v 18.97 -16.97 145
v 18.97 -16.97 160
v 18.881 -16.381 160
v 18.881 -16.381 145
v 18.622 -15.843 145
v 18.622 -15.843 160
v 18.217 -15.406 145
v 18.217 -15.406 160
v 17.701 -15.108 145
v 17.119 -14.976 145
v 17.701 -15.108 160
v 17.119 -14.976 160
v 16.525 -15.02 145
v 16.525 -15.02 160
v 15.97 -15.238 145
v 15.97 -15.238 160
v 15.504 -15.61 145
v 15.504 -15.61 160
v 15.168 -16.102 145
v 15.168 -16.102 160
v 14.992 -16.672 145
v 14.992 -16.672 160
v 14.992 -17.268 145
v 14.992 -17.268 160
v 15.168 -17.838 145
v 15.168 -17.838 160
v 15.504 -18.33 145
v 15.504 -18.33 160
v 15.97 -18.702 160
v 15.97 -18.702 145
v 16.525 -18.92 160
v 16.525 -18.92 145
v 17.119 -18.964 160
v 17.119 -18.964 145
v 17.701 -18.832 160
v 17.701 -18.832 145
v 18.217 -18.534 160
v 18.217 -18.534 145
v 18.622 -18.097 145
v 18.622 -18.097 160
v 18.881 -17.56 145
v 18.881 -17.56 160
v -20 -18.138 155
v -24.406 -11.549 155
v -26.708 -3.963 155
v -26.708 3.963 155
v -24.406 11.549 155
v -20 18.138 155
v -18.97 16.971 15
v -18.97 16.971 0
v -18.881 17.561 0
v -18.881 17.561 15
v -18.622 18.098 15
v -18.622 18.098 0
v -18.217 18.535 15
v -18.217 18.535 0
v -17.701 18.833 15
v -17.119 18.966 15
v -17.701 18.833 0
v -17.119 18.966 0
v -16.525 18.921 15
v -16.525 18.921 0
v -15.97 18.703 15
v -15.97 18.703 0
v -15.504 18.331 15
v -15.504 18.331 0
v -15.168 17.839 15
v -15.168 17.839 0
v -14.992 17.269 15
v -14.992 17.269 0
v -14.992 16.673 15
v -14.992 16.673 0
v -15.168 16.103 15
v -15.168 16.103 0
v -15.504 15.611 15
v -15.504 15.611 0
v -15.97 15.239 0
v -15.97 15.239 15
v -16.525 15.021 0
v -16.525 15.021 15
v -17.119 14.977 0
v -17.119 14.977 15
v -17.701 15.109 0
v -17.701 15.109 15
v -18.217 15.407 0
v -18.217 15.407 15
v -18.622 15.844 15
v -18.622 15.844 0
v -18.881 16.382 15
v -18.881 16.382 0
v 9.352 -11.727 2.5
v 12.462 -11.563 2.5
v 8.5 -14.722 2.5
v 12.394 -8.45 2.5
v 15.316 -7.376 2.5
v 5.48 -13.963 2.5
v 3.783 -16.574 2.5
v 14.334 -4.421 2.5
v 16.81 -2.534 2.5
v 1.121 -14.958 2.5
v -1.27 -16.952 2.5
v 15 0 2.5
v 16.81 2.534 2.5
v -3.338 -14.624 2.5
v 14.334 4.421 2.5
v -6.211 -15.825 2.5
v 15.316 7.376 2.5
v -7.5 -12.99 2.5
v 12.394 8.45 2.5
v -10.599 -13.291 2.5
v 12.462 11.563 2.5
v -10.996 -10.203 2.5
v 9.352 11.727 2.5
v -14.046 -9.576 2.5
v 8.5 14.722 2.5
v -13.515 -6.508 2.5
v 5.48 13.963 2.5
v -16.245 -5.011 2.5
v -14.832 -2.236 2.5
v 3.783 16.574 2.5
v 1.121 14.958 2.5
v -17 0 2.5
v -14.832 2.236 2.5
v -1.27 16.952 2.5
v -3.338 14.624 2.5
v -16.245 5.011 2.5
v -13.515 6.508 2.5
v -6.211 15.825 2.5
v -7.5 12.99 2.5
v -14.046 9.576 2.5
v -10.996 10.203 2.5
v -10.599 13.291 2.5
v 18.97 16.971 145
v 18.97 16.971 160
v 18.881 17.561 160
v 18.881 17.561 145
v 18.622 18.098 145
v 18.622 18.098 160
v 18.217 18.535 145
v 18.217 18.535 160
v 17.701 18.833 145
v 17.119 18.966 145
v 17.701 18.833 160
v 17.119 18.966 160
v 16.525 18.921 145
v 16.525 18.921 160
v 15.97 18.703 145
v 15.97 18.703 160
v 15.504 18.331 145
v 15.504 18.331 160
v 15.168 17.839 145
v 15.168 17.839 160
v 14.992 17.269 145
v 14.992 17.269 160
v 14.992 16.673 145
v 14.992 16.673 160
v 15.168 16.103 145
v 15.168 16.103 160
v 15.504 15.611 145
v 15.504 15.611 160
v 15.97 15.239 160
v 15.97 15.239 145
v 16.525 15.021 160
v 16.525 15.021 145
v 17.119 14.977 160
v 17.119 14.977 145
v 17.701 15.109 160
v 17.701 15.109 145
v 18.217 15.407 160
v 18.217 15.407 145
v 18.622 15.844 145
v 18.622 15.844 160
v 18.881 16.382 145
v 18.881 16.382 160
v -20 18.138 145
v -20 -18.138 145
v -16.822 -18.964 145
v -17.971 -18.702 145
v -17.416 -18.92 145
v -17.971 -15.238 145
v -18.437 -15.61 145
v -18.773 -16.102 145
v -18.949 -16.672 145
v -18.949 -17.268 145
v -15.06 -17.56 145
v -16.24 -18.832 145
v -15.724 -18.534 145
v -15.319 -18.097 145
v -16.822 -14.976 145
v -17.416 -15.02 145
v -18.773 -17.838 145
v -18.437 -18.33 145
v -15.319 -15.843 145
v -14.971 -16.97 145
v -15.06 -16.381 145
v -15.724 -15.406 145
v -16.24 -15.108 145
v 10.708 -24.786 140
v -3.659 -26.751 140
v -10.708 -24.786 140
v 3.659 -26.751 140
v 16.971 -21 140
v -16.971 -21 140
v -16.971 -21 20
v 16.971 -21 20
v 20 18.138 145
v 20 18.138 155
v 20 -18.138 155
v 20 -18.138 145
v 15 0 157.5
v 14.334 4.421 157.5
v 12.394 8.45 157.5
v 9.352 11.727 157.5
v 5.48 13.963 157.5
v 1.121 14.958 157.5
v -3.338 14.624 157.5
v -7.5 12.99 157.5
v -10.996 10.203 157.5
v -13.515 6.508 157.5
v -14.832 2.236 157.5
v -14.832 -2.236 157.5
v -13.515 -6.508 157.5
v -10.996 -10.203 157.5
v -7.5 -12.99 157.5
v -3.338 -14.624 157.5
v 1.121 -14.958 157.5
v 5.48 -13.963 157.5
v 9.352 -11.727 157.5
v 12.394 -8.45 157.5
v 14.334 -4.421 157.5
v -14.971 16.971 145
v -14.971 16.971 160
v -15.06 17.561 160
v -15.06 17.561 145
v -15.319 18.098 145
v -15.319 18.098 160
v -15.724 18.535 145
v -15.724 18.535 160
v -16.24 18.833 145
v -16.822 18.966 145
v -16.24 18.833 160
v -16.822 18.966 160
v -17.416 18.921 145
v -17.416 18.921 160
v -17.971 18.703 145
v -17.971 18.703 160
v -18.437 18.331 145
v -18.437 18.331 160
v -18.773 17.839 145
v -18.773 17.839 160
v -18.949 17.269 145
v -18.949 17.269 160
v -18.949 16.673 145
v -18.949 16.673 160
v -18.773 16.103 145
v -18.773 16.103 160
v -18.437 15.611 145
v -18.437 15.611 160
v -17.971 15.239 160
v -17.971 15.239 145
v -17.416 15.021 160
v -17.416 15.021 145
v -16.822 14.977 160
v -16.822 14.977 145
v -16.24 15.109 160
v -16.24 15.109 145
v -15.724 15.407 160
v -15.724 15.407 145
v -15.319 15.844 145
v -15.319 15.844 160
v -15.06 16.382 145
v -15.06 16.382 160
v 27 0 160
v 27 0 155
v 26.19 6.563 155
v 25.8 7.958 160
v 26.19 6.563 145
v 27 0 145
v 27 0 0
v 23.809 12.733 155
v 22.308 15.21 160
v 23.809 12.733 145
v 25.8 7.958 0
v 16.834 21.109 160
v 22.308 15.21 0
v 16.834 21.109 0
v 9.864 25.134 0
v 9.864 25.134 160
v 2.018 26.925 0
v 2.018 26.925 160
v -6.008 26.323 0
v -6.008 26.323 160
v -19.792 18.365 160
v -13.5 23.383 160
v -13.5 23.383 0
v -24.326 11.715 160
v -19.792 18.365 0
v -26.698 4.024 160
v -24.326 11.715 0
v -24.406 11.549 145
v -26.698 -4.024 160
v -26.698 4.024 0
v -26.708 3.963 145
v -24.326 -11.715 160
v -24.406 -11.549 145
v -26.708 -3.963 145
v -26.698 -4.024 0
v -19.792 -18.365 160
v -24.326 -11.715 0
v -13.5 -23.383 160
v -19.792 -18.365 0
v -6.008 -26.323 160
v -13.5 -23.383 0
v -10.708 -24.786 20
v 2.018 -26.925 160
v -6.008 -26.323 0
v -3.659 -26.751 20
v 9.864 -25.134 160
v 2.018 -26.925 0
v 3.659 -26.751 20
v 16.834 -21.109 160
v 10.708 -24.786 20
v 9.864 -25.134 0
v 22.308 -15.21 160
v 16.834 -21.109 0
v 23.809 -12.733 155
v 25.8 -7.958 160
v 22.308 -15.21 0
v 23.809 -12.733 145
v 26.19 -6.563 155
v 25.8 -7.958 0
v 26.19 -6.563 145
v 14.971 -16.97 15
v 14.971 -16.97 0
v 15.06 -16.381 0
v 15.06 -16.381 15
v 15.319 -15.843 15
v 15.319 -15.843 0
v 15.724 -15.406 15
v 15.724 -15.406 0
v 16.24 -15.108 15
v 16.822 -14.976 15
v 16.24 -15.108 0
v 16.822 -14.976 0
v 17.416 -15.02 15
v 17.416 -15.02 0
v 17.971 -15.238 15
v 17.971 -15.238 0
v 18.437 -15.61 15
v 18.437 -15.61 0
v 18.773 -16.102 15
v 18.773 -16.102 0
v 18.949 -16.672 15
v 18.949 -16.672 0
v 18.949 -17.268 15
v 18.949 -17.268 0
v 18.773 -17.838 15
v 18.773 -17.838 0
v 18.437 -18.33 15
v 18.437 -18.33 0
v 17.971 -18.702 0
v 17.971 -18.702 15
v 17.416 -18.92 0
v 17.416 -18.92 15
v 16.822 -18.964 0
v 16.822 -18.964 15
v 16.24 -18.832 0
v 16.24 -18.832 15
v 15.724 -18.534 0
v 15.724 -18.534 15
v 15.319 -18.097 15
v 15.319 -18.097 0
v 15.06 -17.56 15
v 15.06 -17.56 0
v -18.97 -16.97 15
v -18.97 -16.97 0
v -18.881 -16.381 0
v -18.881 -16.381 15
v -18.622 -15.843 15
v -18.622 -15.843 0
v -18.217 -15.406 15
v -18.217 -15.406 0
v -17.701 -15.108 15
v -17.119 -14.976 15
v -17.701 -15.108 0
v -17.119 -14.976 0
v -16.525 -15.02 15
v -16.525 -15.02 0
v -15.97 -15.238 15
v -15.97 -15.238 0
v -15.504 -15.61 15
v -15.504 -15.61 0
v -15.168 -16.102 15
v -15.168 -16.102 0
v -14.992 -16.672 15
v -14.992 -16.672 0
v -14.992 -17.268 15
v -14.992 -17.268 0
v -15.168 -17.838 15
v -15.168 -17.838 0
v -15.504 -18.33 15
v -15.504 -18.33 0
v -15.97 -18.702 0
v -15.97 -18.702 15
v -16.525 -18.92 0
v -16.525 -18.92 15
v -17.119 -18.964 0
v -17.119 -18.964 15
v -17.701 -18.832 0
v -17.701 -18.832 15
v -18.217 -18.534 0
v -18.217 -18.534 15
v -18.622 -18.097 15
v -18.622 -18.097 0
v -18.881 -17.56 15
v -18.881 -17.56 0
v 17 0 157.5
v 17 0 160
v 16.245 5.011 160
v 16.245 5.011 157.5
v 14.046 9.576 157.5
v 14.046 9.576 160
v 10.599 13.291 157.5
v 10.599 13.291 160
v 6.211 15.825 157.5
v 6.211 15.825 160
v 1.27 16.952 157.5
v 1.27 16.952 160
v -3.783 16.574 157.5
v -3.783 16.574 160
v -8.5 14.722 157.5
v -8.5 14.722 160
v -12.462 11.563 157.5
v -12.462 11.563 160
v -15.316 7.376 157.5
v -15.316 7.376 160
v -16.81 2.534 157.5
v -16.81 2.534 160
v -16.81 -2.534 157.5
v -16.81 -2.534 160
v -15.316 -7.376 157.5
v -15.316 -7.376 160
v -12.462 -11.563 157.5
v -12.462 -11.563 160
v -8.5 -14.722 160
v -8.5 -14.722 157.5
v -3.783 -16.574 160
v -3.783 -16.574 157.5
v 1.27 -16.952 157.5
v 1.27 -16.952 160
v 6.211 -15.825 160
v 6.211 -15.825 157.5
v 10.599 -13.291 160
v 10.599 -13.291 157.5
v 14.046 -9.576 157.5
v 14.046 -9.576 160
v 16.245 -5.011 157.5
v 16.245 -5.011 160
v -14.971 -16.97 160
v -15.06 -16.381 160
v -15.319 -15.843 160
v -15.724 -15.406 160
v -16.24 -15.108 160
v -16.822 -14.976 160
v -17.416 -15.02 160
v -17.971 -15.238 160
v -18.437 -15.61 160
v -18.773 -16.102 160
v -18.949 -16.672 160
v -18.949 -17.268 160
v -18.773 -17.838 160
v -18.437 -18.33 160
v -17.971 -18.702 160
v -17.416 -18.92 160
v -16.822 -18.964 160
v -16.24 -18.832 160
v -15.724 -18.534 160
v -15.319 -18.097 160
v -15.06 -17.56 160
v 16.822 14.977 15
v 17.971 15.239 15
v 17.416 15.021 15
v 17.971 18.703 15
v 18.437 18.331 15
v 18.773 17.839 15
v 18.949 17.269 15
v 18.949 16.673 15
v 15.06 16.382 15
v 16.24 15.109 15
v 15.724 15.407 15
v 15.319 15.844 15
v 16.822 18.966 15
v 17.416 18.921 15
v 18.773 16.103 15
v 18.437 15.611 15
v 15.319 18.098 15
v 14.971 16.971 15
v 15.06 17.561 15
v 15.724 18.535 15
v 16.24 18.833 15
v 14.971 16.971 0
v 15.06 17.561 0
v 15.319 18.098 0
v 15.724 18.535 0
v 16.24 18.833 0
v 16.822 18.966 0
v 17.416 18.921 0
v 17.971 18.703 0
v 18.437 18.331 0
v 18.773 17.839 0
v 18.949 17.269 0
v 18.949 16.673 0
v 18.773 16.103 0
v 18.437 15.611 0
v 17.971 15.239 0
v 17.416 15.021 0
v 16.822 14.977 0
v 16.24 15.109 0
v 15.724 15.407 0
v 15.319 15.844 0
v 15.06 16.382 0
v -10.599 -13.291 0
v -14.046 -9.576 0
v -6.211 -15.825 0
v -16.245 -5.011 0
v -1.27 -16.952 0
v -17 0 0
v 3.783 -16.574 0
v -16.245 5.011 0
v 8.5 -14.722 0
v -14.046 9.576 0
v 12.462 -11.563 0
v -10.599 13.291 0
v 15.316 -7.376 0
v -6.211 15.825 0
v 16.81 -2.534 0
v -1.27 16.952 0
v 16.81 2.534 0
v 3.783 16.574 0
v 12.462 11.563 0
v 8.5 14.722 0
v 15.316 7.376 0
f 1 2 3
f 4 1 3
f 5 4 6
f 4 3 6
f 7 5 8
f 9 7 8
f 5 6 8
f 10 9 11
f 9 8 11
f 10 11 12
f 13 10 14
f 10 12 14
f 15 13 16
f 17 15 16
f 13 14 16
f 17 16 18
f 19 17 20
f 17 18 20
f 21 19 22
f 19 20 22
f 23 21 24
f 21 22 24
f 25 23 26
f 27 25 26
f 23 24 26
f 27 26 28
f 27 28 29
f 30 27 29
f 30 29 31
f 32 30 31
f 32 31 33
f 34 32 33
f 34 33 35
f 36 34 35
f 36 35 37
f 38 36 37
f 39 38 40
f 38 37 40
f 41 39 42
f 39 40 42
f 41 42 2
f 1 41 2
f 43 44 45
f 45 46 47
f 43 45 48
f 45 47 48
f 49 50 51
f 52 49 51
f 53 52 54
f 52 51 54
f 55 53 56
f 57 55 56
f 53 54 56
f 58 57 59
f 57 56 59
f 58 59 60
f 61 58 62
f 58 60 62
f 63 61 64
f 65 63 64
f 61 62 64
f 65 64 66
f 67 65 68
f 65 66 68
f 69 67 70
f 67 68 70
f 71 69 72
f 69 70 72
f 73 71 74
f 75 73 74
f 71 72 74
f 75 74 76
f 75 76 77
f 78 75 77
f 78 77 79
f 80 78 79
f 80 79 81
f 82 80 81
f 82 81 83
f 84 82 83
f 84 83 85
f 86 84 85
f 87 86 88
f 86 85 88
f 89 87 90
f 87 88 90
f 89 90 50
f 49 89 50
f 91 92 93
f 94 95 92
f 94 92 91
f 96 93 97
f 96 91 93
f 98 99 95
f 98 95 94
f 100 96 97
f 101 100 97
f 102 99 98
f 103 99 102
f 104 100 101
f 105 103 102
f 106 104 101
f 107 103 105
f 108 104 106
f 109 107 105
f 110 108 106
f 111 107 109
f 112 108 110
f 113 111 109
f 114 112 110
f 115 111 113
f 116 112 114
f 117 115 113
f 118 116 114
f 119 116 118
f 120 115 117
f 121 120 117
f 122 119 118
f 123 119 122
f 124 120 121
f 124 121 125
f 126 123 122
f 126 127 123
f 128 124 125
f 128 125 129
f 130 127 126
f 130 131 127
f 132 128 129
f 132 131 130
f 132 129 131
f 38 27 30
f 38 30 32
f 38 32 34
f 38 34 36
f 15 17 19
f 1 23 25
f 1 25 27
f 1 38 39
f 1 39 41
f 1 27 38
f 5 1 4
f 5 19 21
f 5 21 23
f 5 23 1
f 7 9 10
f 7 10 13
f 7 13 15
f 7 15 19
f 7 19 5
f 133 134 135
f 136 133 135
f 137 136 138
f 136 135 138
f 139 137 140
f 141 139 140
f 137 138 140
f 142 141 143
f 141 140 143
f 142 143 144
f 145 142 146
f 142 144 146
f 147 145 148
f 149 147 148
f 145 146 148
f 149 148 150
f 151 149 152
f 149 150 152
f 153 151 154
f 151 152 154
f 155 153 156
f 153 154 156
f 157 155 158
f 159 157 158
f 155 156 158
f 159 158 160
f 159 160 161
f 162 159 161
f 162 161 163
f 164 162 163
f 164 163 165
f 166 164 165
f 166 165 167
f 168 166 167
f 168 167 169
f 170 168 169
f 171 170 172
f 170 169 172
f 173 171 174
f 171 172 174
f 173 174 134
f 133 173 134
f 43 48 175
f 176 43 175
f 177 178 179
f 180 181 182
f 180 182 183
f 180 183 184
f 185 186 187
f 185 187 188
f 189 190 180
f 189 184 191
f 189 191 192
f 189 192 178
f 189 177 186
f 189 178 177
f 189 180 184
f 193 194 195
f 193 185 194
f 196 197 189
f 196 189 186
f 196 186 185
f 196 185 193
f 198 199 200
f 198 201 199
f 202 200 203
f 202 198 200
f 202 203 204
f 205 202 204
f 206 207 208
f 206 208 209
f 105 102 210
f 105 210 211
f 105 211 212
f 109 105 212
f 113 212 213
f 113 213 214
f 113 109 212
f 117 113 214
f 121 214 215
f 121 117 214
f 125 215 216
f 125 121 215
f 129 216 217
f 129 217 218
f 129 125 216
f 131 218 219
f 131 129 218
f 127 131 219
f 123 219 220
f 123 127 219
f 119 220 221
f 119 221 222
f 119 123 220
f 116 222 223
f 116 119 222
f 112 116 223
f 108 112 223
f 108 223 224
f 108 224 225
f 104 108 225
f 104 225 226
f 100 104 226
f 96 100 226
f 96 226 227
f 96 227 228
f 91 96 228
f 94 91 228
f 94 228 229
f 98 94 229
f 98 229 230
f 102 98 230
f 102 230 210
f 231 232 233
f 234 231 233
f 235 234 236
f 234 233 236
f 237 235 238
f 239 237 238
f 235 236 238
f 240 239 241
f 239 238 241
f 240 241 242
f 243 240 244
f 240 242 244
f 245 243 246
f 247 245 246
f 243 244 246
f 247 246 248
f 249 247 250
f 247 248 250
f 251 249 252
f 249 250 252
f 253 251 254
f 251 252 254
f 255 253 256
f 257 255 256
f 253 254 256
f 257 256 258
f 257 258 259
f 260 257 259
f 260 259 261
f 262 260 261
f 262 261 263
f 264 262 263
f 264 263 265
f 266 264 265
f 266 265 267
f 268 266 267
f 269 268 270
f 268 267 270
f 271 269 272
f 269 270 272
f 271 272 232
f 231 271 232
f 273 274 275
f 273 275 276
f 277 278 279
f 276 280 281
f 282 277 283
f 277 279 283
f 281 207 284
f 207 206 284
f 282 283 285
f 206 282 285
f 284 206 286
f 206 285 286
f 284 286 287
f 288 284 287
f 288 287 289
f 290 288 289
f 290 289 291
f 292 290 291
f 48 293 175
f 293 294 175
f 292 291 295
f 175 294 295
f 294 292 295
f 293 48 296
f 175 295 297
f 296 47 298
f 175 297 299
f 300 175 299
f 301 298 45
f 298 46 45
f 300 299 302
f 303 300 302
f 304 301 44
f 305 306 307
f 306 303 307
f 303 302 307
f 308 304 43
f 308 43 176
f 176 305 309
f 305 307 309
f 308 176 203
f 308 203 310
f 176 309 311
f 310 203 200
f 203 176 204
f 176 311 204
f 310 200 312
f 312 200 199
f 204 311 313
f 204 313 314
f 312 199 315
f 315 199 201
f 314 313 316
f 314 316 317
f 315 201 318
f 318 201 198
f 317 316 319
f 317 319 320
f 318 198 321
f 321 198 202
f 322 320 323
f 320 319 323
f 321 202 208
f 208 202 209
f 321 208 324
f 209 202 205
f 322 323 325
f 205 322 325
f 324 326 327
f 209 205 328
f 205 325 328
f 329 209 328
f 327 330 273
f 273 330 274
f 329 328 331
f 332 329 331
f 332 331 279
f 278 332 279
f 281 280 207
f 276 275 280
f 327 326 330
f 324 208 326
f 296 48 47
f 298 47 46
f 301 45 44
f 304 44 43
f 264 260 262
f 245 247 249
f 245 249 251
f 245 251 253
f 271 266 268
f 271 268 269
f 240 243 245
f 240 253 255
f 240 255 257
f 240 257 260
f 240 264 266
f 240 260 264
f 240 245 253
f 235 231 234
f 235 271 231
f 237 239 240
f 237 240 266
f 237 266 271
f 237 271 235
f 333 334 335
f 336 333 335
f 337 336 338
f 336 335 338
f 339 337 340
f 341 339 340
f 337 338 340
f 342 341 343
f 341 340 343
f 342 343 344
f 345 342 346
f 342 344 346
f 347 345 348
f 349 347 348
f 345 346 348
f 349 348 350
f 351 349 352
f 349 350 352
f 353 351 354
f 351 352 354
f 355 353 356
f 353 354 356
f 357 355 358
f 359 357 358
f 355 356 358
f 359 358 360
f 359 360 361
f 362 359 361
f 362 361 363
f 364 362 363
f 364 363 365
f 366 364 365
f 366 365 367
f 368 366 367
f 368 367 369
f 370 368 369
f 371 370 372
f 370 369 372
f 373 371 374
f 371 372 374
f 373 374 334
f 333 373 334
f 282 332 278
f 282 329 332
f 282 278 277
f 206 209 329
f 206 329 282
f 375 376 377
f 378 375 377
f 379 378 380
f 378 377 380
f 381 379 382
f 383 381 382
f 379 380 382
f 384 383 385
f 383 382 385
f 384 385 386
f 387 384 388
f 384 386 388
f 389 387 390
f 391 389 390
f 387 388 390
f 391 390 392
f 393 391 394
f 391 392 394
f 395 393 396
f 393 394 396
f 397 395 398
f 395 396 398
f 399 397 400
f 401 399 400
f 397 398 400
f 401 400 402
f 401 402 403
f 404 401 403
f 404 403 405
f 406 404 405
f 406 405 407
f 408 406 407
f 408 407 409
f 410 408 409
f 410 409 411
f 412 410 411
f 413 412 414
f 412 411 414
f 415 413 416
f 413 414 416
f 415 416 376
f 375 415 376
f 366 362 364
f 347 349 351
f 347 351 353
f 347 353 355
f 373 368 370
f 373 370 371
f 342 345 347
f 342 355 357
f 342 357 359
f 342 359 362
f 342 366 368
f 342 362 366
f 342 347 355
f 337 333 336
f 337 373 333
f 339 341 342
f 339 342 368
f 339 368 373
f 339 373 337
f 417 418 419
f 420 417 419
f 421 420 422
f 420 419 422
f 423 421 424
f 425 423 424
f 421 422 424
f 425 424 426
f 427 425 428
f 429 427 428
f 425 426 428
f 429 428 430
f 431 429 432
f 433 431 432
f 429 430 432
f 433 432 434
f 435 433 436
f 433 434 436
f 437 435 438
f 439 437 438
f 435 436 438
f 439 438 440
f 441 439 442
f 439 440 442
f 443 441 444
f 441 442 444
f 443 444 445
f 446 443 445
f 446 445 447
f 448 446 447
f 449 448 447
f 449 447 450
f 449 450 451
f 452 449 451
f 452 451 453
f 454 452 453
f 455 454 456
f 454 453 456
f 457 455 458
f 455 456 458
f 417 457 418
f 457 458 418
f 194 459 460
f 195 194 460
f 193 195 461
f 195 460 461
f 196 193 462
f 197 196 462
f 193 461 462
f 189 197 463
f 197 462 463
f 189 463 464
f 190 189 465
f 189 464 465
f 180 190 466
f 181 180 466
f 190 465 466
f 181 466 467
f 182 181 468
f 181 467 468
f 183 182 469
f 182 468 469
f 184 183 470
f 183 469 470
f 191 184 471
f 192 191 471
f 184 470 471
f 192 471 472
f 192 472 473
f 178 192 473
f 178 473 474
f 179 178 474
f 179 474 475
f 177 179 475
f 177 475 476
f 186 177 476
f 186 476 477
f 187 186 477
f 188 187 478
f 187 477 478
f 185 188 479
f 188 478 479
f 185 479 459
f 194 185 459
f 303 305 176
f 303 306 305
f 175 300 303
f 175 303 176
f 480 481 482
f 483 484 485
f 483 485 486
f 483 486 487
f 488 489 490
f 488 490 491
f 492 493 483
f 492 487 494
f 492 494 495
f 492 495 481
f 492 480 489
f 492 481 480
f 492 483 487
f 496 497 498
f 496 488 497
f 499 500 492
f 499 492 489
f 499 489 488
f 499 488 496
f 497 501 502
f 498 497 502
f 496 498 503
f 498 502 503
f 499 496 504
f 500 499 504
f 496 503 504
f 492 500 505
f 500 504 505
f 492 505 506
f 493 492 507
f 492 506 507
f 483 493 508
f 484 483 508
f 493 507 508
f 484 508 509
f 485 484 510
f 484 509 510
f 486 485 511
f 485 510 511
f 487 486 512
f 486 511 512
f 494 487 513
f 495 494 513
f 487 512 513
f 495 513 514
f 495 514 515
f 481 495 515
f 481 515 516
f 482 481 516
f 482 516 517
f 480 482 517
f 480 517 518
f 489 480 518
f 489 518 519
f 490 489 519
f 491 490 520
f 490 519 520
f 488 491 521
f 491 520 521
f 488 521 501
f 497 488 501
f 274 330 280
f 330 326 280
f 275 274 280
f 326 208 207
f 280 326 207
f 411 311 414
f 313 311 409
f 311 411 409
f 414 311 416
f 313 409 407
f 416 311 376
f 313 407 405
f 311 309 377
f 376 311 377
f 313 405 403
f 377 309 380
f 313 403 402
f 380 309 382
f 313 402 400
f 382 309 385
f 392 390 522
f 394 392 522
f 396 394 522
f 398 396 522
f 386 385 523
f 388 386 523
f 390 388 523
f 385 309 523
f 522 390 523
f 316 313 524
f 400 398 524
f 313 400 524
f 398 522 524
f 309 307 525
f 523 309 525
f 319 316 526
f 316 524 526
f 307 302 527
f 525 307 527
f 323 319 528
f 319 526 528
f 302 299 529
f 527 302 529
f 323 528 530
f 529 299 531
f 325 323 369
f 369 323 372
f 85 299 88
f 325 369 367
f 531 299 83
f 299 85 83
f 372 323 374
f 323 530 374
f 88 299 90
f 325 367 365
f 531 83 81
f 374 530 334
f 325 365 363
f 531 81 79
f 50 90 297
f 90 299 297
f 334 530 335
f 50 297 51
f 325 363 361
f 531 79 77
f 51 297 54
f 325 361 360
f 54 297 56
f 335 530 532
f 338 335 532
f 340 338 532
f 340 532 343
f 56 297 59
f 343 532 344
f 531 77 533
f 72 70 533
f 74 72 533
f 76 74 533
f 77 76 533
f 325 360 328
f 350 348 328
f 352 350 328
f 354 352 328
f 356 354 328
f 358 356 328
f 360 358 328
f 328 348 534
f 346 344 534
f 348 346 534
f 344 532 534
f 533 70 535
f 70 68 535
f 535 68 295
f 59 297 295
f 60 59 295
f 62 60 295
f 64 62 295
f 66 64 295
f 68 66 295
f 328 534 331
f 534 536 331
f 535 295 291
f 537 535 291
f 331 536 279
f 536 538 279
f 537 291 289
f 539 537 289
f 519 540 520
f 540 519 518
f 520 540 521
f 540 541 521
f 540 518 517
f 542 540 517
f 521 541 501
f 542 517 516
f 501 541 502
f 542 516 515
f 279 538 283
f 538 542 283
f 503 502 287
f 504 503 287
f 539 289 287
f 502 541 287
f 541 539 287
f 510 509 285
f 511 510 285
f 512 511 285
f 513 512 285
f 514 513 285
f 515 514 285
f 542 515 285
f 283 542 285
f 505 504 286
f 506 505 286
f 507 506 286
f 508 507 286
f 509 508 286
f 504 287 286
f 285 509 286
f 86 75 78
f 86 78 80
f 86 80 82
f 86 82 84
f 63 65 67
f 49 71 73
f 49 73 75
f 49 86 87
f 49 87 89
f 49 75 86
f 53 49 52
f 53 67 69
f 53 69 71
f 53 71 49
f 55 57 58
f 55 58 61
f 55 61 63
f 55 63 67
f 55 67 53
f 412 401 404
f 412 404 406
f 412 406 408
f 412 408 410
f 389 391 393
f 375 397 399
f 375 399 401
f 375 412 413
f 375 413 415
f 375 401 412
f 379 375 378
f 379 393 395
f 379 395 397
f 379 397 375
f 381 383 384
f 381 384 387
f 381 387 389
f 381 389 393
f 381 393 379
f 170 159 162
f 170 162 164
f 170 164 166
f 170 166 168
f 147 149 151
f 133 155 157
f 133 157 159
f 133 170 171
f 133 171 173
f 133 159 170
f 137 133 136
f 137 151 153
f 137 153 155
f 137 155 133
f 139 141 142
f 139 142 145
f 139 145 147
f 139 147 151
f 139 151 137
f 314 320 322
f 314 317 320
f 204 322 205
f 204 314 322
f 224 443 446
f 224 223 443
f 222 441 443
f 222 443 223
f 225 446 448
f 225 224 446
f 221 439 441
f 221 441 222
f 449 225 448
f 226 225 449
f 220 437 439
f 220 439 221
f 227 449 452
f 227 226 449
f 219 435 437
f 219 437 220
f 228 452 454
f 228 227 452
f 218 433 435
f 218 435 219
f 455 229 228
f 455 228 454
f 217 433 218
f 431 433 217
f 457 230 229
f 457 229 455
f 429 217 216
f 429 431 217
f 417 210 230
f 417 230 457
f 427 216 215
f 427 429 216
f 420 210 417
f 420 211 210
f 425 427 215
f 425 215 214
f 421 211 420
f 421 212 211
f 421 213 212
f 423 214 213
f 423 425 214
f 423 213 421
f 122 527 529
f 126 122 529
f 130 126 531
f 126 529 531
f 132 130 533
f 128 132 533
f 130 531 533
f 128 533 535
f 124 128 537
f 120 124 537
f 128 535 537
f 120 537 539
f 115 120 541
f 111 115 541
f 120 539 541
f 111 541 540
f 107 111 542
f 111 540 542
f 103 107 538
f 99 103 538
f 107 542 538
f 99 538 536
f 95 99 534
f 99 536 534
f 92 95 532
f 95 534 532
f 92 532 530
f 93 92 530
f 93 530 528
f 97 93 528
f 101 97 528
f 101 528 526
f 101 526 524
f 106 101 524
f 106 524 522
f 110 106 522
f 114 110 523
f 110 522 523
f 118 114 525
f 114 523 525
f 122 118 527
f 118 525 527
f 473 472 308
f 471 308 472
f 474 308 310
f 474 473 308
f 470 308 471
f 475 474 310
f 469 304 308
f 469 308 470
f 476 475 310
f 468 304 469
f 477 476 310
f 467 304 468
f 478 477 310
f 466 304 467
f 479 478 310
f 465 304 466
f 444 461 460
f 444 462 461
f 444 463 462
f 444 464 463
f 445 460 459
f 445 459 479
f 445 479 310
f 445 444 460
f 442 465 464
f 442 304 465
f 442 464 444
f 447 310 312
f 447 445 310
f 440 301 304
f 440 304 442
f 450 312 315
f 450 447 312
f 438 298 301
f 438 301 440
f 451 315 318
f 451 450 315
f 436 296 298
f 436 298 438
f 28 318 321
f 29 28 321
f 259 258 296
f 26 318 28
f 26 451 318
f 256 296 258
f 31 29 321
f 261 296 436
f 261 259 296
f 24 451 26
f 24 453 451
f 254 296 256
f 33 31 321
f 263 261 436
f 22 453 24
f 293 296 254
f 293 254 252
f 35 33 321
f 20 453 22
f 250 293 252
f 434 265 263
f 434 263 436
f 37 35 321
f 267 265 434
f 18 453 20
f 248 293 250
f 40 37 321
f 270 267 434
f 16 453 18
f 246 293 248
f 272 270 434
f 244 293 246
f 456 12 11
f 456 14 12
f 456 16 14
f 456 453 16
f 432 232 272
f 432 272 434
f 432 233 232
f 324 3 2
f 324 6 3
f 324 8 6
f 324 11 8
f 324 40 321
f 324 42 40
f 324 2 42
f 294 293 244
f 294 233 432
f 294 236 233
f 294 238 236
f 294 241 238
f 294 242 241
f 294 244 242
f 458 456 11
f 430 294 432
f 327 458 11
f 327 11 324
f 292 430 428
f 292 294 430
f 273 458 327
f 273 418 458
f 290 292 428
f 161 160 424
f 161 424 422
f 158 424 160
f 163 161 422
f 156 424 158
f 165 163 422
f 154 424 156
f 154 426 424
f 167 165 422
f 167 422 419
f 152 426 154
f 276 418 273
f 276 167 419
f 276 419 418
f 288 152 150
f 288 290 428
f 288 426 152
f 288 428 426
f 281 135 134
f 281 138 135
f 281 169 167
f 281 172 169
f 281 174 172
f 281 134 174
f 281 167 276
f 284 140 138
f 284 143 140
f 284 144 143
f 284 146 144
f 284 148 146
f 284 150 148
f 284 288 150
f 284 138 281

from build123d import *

# Parameters (mm, degrees)
ESQUISSE1_R           = 27
ESQUISSE1_R_2         = 15
EXTRUSION1_DEPTH      = 160
ESQUISSE2_R           = 2
EXTRUSION2_DEPTH      = 15
ESQUISSE3_R           = 2
EXTRUSION3_DEPTH      = 15
ESQUISSE4_R           = 17
ESQUISSE4_R_2         = 15
EXTRUSION4_DEPTH      = 2.5
ESQUISSE5_R           = 17
ESQUISSE5_R_2         = 15
EXTRUSION5_DEPTH      = 2.5
ESQUISSE6_W           = 120
ESQUISSE6_H           = 6
EXTRUSION6_DEPTH      = 28
EXTRUSION6_DEPTH_BACK = 28
ESQUISSE7_W           = 7
ESQUISSE7_H           = 10
EXTRUSION7_DEPTH      = 28
EXTRUSION7_DEPTH_BACK = 28


with BuildPart() as part:
    # Esquisse1 → Extrusion1 (new body)
    with BuildSketch(Plane.XY):
        Circle(ESQUISSE1_R)
        Circle(ESQUISSE1_R_2, mode=Mode.SUBTRACT)
    extrude(amount=EXTRUSION1_DEPTH)

    # Esquisse2 → Extrusion2 (cut)
    with BuildSketch(Plane.XY.offset(160)):
        with Locations((16.970013406, 16.971095673)):
            Circle(ESQUISSE2_R)
        with Locations((16.970013406, -16.970029824)):
            Circle(ESQUISSE2_R)
        with Locations((-16.971112091, -16.970029824)):
            Circle(ESQUISSE2_R)
        with Locations((-16.971112091, 16.971095673)):
            Circle(ESQUISSE2_R)
    extrude(amount=-EXTRUSION2_DEPTH, mode=Mode.SUBTRACT)

    # Esquisse3 → Extrusion3 (cut)
    with BuildSketch(Plane(origin=(0, 0, 0), x_dir=(-1, 0, 0), z_dir=(0, 0, -1))):
        with Locations((16.970013406, 16.971095673)):
            Circle(ESQUISSE3_R)
        with Locations((-16.971112091, 16.971095673)):
            Circle(ESQUISSE3_R)
        with Locations((-16.971112091, -16.970029824)):
            Circle(ESQUISSE3_R)
        with Locations((16.970013406, -16.970029824)):
            Circle(ESQUISSE3_R)
    extrude(amount=-EXTRUSION3_DEPTH, mode=Mode.SUBTRACT)

    # Esquisse4 → Extrusion4 (cut)
    with BuildSketch(Plane.XY.offset(160)):
        Circle(ESQUISSE4_R)
        Circle(ESQUISSE4_R_2, mode=Mode.SUBTRACT)
    extrude(amount=-EXTRUSION4_DEPTH, mode=Mode.SUBTRACT)

    # Esquisse5 → Extrusion5 (cut)
    with BuildSketch(Plane(origin=(0, 0, 0), x_dir=(-1, 0, 0), z_dir=(0, 0, -1))):
        Circle(ESQUISSE5_R)
        Circle(ESQUISSE5_R_2, mode=Mode.SUBTRACT)
    extrude(amount=-EXTRUSION5_DEPTH, mode=Mode.SUBTRACT)

    # Esquisse6 → Extrusion6 (cut, two sides)
    with BuildSketch(Plane(origin=(0, 0, 0), x_dir=(0, 0, -1), z_dir=(1, 0, 0))) as extrusion6_sk:
        with Locations((-80, -24)):
            Rectangle(ESQUISSE6_W, ESQUISSE6_H)
    extrude(amount=EXTRUSION6_DEPTH, mode=Mode.SUBTRACT)
    extrude(extrusion6_sk.sketch, amount=-EXTRUSION6_DEPTH_BACK, mode=Mode.SUBTRACT)

    # Esquisse7 → Extrusion7 (cut, two sides)
    with BuildSketch(Plane(origin=(0, 0, 0), x_dir=(1, 0, 0), z_dir=(0, 1, 0))) as extrusion7_sk:
        with Locations((23.5, -150)):
            Rectangle(ESQUISSE7_W, ESQUISSE7_H)
        with Locations((-23.5, -150)):
            Rectangle(ESQUISSE7_W, ESQUISSE7_H)
    extrude(amount=EXTRUSION7_DEPTH, mode=Mode.SUBTRACT)
    extrude(extrusion7_sk.sketch, amount=-EXTRUSION7_DEPTH_BACK, mode=Mode.SUBTRACT)


solid = part.part
